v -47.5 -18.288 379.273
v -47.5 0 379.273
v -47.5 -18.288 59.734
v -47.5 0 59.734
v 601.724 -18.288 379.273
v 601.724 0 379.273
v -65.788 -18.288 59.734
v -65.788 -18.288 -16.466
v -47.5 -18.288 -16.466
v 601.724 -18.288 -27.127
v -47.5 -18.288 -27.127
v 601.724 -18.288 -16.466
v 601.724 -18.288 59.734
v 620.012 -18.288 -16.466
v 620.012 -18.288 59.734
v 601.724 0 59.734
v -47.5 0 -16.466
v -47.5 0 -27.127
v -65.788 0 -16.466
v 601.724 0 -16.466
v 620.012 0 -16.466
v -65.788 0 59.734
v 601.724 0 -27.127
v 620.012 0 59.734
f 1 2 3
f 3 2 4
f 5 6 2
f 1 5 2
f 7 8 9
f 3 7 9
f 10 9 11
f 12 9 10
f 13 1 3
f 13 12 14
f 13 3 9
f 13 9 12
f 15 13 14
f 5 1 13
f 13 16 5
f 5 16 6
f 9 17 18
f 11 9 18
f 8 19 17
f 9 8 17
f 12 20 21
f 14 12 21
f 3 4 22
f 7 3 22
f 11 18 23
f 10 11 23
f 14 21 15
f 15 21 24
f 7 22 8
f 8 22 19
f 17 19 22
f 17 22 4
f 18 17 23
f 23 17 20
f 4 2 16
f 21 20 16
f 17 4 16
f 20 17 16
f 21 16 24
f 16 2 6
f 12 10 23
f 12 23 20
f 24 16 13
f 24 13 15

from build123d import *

# Parameters (mm, degrees)
F0_W     = 18.288
F0_H     = 76.2
F1_DEPTH = 18.288


with BuildPart() as f1:
    # F0 (on Front) → F1 (new body)
    with BuildSketch(Plane.XZ):
        Polygon((601.724416, 379.273323), (-47.499584, 379.273323), (-47.499584, 59.734055), (-47.499584, -16.465945), (-47.499584, -27.126677), (601.724416, -27.126677), (601.724416, -16.465945), (601.724416, 59.734055), align=None)
        Polygon((-47.499584, -16.465945), (-47.499584, 59.734055), (-65.787584, 59.734055), (-65.787584, 21.634055), (-65.787584, -5.497572), (-65.787584, -16.465945), align=None)
        with Locations((610.868416, 21.634055)):
            Rectangle(F0_W, F0_H)
    extrude(amount=F1_DEPTH)


solid = f1.part
